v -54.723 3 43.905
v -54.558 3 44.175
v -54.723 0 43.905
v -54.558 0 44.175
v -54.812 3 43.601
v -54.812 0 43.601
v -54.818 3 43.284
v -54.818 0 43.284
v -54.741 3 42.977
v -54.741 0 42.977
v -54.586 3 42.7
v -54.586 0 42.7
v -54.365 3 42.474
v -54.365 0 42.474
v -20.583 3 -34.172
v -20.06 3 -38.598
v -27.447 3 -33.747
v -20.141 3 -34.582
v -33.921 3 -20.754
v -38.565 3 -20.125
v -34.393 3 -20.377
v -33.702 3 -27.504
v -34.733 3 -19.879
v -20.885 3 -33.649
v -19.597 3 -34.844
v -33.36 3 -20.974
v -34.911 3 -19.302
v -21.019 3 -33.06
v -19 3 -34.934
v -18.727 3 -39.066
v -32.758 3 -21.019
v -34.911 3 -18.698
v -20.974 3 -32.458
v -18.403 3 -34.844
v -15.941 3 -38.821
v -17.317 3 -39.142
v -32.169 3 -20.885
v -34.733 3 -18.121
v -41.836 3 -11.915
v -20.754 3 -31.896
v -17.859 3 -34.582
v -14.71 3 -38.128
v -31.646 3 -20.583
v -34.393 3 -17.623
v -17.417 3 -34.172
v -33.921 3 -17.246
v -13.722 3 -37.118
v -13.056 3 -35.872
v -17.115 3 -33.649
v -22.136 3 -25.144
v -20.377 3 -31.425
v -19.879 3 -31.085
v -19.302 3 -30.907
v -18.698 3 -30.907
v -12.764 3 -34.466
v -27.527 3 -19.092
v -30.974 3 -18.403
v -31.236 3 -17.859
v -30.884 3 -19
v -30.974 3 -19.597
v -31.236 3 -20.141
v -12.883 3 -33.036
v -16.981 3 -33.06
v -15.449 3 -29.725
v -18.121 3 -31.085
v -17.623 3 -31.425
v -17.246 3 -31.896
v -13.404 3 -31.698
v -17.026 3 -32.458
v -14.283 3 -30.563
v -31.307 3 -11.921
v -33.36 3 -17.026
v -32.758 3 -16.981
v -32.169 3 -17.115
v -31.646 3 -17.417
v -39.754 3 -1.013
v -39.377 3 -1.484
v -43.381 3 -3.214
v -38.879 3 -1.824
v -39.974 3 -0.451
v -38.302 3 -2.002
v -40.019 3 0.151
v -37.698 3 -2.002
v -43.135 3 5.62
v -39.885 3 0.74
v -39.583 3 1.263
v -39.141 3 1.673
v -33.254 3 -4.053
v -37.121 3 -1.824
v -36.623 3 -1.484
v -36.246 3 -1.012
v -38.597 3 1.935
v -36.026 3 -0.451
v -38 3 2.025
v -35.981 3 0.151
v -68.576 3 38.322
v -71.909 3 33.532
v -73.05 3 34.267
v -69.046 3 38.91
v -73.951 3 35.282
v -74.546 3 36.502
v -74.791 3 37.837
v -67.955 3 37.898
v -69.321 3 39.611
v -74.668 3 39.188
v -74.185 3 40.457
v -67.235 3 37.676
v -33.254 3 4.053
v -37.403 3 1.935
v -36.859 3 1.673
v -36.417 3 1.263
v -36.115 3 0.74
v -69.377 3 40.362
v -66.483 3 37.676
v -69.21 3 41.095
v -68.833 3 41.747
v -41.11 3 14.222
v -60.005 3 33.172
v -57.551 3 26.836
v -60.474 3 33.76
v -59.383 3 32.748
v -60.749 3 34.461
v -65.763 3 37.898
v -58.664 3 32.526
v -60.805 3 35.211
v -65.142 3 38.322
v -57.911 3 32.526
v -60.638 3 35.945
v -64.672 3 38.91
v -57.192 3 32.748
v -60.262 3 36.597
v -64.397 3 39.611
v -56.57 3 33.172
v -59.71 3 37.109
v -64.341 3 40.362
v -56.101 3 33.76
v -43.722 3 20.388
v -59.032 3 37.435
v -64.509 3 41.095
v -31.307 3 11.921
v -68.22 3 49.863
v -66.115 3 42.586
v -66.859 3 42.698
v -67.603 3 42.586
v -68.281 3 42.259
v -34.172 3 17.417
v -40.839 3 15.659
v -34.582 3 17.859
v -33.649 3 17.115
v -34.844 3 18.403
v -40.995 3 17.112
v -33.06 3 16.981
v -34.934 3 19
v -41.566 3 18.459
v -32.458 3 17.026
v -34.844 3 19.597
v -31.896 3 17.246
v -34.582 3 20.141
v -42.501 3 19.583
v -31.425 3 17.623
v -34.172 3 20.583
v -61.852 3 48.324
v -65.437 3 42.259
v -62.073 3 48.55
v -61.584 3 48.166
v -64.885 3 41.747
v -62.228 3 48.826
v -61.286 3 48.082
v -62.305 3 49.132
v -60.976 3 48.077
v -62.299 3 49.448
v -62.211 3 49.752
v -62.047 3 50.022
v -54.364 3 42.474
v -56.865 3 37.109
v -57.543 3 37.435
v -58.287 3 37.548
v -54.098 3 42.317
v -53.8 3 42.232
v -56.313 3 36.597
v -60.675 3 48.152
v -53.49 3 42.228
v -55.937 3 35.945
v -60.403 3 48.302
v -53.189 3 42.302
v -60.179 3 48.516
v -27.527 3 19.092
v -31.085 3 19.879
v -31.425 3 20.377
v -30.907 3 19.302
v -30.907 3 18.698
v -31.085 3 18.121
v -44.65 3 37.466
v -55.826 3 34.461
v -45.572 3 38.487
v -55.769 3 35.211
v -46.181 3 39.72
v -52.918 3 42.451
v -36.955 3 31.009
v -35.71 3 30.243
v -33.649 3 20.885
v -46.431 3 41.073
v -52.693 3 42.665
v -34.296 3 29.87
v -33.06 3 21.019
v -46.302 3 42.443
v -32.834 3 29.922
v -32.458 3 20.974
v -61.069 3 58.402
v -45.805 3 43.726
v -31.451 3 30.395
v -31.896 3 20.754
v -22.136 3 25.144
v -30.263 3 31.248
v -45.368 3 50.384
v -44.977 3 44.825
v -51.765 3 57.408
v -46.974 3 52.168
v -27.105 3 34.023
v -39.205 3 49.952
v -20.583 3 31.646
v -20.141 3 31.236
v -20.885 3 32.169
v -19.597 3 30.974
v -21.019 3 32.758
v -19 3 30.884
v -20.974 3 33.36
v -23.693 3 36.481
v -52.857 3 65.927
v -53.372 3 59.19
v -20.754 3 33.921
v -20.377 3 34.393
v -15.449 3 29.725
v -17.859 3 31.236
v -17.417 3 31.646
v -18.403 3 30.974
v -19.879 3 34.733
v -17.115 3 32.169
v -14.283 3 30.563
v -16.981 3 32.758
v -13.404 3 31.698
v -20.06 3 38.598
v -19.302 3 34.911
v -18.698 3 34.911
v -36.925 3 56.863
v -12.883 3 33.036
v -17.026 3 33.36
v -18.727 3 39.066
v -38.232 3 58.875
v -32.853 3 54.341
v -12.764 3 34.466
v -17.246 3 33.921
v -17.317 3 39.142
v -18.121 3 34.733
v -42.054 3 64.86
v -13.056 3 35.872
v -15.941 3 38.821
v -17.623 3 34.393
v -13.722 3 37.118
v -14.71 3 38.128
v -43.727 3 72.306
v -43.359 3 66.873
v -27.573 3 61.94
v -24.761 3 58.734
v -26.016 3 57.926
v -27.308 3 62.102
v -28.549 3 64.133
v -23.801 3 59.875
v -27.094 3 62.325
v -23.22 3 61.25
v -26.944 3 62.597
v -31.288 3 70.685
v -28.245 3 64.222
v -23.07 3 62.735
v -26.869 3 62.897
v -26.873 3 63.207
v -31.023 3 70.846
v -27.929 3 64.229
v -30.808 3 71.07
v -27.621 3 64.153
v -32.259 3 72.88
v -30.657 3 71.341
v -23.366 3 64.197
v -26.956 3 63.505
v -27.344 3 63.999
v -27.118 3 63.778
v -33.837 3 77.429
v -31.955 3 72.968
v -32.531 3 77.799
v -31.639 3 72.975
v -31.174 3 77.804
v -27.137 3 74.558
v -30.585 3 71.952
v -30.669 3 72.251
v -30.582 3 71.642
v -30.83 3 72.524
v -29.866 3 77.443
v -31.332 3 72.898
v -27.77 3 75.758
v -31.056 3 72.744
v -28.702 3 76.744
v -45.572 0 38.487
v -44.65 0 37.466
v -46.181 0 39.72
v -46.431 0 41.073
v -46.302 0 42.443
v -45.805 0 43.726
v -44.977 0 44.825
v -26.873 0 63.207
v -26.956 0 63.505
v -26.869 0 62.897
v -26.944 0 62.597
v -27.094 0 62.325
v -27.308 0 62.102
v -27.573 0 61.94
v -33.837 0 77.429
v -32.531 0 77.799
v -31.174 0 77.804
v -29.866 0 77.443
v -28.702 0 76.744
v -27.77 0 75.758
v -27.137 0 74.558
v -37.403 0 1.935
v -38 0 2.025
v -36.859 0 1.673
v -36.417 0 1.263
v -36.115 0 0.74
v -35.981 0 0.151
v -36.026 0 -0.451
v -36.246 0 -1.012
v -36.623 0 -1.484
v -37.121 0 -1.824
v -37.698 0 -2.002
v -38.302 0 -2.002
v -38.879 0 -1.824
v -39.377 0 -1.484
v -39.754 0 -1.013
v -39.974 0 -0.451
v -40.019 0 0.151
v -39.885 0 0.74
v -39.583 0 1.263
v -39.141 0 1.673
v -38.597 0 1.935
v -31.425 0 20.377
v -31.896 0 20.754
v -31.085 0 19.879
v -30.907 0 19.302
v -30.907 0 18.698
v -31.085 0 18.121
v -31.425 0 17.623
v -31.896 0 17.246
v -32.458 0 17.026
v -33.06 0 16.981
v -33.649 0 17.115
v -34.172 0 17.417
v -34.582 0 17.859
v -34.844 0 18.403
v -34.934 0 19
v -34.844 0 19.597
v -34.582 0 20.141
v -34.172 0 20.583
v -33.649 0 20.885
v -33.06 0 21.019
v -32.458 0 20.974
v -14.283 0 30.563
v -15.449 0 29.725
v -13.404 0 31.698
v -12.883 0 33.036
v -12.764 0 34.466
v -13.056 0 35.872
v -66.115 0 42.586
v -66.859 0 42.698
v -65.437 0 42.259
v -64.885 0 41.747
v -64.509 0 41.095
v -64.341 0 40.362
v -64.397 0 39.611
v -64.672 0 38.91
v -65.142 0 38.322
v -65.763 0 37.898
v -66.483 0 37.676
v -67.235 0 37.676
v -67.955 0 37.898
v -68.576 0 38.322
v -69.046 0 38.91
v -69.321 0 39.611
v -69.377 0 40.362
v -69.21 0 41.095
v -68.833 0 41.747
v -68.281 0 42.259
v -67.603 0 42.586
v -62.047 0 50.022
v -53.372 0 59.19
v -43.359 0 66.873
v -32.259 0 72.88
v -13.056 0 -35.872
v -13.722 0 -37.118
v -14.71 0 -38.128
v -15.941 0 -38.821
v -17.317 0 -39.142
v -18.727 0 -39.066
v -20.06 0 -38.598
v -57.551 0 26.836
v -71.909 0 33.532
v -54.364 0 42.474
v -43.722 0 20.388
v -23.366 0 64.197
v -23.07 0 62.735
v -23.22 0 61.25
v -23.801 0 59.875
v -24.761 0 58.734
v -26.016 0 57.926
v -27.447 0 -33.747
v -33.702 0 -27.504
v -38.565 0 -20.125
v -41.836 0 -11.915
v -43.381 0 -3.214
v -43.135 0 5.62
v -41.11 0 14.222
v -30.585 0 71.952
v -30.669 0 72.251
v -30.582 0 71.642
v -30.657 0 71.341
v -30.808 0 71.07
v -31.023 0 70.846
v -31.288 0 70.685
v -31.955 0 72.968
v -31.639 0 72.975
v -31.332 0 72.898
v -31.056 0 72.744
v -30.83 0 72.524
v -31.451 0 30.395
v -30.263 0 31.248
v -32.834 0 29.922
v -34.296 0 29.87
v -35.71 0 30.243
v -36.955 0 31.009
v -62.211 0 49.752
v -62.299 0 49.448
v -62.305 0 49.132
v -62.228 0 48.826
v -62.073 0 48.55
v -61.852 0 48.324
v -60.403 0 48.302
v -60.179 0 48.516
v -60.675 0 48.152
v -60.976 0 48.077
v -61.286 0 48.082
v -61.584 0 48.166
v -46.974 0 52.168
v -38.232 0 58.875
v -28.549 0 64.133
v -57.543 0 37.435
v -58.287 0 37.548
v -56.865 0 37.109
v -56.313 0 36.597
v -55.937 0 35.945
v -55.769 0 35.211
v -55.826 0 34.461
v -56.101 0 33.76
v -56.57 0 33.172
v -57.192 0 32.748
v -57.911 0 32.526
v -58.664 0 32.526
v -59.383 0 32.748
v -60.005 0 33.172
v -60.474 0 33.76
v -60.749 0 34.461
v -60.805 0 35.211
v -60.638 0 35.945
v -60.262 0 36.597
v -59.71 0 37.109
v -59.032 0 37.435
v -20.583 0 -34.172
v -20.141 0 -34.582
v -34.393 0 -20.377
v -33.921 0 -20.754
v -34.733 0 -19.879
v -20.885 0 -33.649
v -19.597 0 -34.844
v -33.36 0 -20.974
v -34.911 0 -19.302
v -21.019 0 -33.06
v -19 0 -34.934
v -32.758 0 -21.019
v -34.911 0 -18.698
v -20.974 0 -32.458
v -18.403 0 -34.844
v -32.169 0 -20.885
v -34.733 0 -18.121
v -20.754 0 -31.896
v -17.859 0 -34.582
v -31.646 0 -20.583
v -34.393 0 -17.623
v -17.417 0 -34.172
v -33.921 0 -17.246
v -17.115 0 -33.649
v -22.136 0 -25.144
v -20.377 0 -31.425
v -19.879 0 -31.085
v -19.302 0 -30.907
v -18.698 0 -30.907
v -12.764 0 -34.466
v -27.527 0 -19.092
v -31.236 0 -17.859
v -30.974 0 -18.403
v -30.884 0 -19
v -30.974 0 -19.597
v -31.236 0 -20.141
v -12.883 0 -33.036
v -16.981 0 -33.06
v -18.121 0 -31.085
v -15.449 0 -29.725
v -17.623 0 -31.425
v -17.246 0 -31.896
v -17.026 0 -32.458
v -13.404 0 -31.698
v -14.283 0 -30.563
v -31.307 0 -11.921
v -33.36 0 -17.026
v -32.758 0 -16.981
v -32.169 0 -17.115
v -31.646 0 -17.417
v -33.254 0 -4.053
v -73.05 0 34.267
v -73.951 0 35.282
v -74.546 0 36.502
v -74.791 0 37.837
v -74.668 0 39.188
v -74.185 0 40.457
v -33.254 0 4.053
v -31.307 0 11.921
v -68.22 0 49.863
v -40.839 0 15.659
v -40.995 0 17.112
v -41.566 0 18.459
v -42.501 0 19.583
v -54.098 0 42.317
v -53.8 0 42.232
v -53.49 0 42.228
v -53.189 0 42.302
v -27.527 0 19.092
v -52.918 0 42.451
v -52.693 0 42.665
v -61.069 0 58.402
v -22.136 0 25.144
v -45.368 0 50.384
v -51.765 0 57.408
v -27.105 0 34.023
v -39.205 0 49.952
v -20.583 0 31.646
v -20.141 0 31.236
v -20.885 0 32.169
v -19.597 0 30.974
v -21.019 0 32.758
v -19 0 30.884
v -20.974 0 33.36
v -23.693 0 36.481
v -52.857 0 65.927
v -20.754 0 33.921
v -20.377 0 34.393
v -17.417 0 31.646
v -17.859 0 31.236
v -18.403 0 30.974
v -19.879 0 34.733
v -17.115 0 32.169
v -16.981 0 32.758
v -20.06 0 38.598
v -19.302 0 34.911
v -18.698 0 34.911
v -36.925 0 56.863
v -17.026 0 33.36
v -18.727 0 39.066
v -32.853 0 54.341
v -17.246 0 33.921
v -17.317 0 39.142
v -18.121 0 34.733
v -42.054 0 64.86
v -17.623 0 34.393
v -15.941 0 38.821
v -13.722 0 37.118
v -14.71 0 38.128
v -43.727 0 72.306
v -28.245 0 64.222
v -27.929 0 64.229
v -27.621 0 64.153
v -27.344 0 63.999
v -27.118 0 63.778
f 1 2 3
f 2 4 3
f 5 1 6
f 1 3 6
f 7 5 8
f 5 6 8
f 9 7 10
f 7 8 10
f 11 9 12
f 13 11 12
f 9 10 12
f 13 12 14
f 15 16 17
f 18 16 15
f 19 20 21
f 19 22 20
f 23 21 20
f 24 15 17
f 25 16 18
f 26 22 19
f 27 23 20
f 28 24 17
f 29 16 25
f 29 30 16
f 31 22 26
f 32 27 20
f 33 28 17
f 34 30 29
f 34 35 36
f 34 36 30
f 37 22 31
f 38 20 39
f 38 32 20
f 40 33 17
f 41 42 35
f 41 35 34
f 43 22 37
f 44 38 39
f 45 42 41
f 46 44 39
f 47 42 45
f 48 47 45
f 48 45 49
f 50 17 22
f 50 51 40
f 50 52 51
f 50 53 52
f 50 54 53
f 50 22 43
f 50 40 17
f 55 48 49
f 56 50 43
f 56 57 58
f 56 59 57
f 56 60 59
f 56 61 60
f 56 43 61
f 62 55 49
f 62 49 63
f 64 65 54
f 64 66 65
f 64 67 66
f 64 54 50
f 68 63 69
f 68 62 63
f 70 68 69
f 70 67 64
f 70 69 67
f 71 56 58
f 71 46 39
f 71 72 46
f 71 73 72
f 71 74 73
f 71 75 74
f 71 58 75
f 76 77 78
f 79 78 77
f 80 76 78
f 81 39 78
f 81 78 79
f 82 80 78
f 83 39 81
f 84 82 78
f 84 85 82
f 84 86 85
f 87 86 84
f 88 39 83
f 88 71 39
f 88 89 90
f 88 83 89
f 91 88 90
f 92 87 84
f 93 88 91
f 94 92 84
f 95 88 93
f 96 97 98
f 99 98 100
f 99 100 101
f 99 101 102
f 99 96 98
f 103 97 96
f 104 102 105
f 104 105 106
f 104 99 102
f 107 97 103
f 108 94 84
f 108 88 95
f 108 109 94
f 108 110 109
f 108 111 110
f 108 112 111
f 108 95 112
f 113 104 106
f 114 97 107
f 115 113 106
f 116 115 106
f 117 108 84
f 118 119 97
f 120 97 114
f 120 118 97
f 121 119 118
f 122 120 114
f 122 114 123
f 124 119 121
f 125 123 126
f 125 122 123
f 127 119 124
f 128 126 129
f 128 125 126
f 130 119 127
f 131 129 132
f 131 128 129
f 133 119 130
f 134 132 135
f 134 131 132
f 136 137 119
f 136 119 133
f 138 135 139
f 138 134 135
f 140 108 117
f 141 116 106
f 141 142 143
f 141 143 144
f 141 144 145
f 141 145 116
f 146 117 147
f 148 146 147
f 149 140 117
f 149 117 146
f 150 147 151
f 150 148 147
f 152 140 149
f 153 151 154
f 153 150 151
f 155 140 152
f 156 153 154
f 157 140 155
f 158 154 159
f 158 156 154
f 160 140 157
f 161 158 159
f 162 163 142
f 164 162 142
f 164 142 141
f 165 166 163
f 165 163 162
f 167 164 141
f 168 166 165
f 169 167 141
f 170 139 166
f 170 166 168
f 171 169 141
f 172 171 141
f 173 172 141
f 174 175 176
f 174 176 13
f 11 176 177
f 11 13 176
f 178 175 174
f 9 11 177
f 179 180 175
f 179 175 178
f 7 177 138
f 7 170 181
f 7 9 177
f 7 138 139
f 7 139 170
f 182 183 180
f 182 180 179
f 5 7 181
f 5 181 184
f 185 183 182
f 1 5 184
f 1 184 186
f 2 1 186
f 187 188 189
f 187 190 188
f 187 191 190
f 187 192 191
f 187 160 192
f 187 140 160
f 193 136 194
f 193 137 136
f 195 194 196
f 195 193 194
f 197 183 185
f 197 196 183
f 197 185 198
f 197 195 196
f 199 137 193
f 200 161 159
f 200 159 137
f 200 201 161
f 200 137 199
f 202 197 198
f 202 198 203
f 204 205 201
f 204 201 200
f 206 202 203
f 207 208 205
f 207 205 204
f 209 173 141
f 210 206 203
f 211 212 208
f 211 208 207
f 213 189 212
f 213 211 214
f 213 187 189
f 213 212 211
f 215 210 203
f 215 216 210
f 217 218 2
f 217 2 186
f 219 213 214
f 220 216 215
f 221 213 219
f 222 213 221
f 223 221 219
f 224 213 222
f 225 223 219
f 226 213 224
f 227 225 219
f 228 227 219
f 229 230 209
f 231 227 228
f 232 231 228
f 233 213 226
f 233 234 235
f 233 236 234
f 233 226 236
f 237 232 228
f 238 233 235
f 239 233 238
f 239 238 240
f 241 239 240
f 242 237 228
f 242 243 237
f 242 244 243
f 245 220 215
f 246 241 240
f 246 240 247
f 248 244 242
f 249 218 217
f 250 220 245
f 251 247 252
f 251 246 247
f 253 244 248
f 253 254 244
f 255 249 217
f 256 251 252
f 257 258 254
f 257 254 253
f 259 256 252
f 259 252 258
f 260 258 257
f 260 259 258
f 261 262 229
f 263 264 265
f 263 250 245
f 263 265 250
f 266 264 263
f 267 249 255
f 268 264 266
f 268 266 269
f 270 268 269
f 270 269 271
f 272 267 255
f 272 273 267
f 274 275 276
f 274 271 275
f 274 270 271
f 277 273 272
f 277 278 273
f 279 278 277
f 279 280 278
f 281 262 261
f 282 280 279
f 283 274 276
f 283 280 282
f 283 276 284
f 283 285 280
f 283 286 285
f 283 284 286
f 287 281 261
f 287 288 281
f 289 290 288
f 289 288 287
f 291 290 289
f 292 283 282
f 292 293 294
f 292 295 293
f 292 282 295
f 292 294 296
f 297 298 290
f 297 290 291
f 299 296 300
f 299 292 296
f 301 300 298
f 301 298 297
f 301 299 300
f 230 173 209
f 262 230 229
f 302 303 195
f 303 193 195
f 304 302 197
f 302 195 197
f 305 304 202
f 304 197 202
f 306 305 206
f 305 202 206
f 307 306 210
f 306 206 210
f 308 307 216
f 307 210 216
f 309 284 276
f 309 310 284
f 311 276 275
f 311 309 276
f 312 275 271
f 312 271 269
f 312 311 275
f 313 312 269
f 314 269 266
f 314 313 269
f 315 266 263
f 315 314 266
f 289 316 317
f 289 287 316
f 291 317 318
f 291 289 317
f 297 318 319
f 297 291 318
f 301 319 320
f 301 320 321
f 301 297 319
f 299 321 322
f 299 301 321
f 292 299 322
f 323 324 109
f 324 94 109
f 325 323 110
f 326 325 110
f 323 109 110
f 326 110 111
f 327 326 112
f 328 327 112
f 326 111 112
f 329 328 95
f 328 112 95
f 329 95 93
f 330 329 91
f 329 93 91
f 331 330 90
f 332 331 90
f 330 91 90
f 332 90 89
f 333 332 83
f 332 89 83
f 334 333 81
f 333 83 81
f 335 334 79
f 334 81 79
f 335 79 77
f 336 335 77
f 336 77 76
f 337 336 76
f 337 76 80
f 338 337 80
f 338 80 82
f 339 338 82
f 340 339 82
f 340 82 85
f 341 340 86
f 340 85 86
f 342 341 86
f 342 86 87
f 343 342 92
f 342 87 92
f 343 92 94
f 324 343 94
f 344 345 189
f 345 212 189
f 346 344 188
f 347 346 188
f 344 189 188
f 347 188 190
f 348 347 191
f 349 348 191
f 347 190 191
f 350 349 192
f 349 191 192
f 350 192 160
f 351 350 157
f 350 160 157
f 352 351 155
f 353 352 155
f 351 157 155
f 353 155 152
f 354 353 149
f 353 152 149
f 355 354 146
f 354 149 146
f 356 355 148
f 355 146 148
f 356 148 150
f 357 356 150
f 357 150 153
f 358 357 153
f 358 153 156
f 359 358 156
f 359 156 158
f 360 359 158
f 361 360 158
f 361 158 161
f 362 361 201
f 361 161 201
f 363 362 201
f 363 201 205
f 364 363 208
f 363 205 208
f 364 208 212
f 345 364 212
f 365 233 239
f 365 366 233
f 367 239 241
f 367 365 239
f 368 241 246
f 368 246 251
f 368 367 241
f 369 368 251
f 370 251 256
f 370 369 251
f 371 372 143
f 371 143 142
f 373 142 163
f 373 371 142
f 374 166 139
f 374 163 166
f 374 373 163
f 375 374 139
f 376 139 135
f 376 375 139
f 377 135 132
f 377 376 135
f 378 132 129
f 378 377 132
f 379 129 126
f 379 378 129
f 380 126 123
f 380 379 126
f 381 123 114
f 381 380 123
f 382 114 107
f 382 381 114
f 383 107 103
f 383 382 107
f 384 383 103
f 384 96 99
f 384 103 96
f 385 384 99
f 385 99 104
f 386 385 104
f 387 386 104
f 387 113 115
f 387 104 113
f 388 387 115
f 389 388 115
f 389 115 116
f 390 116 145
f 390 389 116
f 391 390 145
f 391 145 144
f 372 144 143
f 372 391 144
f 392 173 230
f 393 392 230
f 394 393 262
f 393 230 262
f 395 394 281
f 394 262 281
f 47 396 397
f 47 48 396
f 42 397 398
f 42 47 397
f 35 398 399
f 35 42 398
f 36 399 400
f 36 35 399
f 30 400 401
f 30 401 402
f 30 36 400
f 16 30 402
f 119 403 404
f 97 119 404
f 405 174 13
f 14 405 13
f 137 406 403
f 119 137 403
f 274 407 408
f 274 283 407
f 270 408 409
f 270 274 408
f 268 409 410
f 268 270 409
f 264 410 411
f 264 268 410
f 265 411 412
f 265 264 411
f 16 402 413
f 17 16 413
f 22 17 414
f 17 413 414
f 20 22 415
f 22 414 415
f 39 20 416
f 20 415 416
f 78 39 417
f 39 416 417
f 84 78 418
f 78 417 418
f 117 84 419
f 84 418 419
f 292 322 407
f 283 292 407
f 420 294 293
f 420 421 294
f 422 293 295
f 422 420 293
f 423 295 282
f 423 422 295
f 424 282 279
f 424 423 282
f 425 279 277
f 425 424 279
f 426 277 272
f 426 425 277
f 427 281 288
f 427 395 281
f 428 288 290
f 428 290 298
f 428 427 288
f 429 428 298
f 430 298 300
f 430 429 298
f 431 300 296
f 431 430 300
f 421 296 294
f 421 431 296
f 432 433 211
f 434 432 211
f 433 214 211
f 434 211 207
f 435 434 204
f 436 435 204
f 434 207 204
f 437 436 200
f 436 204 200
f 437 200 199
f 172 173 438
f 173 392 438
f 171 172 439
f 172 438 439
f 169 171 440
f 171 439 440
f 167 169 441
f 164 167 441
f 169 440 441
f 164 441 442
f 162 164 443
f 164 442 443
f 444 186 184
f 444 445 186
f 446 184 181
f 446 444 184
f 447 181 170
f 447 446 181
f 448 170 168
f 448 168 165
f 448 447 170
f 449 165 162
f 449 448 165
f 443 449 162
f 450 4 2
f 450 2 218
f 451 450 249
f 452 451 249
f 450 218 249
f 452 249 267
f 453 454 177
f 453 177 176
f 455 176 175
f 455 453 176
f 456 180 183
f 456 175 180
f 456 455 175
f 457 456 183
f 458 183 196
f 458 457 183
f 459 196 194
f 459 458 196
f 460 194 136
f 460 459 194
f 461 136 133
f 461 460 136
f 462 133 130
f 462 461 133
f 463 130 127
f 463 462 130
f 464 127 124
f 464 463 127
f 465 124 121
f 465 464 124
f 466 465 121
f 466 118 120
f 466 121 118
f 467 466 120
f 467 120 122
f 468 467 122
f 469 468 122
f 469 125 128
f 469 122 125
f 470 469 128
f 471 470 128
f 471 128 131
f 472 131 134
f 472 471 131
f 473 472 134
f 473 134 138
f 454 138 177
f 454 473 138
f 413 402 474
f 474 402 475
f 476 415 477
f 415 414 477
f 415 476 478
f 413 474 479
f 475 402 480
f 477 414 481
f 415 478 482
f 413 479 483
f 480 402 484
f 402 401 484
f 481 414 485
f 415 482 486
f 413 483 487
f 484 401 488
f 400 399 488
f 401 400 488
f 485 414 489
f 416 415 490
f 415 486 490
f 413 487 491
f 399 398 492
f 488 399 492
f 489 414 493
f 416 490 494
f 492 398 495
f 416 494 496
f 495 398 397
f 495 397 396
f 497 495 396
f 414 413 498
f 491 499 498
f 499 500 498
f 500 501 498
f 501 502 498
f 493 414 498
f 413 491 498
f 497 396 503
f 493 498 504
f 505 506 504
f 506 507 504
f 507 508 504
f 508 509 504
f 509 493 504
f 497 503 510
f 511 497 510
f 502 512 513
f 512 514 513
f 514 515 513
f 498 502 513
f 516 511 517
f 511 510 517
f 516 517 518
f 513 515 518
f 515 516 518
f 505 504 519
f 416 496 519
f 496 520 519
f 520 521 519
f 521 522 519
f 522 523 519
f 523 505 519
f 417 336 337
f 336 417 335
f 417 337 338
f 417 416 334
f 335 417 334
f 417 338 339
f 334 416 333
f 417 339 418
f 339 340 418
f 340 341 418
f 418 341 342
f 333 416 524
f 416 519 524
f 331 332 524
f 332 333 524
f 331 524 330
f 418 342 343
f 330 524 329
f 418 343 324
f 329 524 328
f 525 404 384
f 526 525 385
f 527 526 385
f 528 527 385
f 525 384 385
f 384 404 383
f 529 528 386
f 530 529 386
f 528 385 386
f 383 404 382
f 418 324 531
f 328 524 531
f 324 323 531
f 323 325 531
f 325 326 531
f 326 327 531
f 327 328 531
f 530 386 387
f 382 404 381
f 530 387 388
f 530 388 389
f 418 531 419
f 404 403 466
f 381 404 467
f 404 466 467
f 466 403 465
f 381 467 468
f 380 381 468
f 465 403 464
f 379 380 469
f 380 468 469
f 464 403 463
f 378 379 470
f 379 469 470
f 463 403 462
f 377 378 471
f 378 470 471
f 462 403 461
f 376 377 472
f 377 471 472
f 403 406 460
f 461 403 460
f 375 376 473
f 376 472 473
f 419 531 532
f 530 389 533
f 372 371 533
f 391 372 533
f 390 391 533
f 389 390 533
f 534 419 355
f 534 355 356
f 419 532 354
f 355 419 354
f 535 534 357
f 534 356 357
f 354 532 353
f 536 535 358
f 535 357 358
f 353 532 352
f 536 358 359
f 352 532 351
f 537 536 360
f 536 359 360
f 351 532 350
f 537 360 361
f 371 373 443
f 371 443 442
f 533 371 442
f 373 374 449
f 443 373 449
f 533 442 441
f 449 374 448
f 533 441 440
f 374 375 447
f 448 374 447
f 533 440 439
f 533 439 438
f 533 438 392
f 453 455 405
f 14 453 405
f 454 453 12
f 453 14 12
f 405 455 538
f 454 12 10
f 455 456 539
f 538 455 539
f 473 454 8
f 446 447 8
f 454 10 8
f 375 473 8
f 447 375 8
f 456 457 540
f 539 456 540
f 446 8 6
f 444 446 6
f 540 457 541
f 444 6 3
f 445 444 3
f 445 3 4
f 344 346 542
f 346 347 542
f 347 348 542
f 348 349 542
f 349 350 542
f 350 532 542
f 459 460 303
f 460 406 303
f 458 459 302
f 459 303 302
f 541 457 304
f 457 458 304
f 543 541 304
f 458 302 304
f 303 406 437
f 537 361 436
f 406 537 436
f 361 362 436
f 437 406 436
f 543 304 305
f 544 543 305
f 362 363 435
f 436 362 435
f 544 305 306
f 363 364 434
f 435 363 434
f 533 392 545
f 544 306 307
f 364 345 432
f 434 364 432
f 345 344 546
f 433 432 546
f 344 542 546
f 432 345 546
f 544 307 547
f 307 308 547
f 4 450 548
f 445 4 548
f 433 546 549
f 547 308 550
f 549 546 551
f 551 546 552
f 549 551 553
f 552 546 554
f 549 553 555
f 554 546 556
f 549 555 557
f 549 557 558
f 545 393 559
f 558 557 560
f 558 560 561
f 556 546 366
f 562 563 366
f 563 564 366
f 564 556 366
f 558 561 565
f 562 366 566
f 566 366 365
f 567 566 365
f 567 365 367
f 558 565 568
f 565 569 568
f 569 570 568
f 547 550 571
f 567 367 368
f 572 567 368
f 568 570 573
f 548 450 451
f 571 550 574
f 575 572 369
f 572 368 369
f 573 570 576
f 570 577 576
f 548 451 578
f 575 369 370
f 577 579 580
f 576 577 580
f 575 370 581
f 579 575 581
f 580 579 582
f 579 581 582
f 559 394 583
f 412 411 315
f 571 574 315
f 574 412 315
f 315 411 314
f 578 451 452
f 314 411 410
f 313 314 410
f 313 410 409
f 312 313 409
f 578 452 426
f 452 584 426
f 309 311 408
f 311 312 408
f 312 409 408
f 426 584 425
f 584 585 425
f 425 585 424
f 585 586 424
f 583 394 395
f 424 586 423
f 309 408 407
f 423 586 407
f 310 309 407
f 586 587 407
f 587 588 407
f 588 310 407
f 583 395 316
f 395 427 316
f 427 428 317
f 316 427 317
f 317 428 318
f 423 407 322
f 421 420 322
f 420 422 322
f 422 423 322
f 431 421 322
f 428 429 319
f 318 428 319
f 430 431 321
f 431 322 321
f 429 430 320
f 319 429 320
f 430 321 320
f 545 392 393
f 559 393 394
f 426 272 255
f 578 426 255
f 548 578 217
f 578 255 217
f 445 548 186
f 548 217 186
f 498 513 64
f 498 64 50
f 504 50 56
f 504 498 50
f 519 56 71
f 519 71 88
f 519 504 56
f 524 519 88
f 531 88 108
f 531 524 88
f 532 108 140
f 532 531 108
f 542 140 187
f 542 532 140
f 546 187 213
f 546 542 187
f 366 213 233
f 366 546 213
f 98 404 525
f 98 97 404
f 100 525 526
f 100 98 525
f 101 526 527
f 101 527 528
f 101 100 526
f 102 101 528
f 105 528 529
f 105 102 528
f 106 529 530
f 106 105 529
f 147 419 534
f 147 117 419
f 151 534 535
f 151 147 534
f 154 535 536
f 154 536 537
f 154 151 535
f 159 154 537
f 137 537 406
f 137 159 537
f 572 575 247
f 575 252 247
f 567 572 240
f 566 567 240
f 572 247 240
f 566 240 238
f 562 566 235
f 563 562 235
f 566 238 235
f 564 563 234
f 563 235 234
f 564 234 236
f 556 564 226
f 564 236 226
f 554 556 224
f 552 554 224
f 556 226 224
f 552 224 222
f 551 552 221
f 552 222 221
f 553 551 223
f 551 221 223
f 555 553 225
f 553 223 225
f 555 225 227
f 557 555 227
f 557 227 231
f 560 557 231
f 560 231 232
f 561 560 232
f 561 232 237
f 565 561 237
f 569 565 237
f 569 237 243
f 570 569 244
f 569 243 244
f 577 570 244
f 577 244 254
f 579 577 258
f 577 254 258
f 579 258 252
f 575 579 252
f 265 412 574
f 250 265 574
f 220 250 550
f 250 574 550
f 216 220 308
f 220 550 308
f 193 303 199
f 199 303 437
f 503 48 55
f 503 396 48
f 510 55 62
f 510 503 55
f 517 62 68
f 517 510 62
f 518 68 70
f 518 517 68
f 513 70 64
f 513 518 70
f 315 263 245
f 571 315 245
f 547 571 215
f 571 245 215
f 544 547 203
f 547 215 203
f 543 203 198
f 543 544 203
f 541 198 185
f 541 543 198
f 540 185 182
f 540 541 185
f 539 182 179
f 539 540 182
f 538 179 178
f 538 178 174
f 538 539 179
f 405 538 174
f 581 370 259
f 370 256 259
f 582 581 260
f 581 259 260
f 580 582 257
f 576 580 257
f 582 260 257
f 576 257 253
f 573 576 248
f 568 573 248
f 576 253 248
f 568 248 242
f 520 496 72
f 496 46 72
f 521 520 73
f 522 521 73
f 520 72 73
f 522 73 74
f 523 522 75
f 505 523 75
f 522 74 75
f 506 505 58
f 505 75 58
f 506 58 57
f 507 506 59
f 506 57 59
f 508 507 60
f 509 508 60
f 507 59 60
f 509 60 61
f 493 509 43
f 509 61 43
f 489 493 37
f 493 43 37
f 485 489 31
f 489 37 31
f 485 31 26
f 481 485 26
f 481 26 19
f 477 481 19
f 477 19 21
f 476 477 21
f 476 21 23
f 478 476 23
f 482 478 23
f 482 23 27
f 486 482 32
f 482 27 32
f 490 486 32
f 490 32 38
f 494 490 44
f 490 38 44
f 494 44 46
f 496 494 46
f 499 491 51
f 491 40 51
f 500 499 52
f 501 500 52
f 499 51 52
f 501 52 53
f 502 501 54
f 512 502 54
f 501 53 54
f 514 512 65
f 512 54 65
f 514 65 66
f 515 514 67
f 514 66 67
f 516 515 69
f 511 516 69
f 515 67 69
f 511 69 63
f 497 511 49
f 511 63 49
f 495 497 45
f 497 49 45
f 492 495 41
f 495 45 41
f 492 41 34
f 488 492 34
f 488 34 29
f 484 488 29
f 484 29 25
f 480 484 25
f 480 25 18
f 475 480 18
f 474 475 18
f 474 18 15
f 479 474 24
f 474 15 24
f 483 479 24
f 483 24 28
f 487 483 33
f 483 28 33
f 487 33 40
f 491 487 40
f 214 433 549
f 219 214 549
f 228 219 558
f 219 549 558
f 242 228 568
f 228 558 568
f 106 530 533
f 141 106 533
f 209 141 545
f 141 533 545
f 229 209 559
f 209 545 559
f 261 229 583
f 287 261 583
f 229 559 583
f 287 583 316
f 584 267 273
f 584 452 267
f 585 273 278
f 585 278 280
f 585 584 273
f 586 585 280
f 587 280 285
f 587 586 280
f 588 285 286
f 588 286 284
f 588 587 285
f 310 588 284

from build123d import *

# Parameters (mm, degrees)
SKETCH1_R               = 43.5
SKETCH1_R_2             = 33.5
BOSS_EXTRUDE1_DEPTH     = 3
SKETCH3_R               = 2.025
CUT_EXTRUDE2_DEPTH      = 62.591395503
CIRPATTERN1_COUNT       = 12
CUT_EXTRUDE1_DEPTH      = 62.591395503
BOSS_EXTRUDE2_DEPTH     = 3
CUT_EXTRUDE_THIN1_DEPTH = 3
FILLET1_R               = 1.2
FILLET2_R               = 5
CUT_EXTRUDE3_DEPTH      = 108.998410492
CUT_EXTRUDE3_DEPTH_BACK = 108.998410492
SKETCH6_R               = 2.525


with BuildPart() as part:
    # Sketch1 → Boss-Extrude1 (new body)
    with BuildSketch(Plane(origin=(0, 0, 0), x_dir=(1, 0, 0), z_dir=(0, 1, 0))):
        with Locations(Location((0, 0, 0), (0, 0, 270))):
            Circle(SKETCH1_R)
        with Locations(Location((0, 0, 0), (0, 0, 270))):
            Circle(SKETCH1_R_2, mode=Mode.SUBTRACT)
    extrude(amount=BOSS_EXTRUDE1_DEPTH)

    # Sketch3 → Cut-Extrude2 (cut, symmetric)
    with BuildSketch(Plane(origin=(0, 3, 0), x_dir=(1, 0, 0), z_dir=(0, 1, 0))):
        with Locations(Location((-38, 0, 0), (0, 0, 270))):
            Circle(SKETCH3_R)
    cut_extrude2 = extrude(amount=CUT_EXTRUDE2_DEPTH, both=True, mode=Mode.SUBTRACT)

    # CirPattern1: Cut-Extrude2 ×12 about axis
    cirpattern1_axis = Axis((0, 0, 0), (0, 1, 0))
    for i in range(1, CIRPATTERN1_COUNT):
        add(cut_extrude2.rotate(cirpattern1_axis, i * 360 / CIRPATTERN1_COUNT), mode=Mode.SUBTRACT)

    # Sketch2 → Cut-Extrude1 (cut, symmetric)
    with BuildSketch(Plane(origin=(0, 3, 0), x_dir=(1, 0, 0), z_dir=(0, 1, 0))):
        with BuildLine():
            Line((0, 0), (43.5, 0))
            ThreePointArc((43.5, 0), (24.950574981, -35.633113927), (-14.877876235, -40.876629004))
            Line((-14.877876235, -40.876629004), (0, 0))
        make_face()
    cut_extrude1 = extrude(amount=CUT_EXTRUDE1_DEPTH, both=True, mode=Mode.SUBTRACT)

    # Mirror1: Cut-Extrude1 across plane
    add(cut_extrude1.mirror(Plane.XY), mode=Mode.SUBTRACT)

    # Sketch4 → Boss-Extrude2 (add)
    with BuildSketch(Plane(origin=(0, 0, 0), x_dir=(1, 0, 0), z_dir=(0, 1, 0))):
        with BuildLine():
            ThreePointArc((-33.322933276, -27.961261021), (-36.687527893, -23.372532963), (-39.424388736, -18.383894386))
            Line((-39.424388736, -18.383894386), (-57.550544477, -26.836259621))
            Line((-57.550544477, -26.836259621), (-76.583008005, -35.711243117))
            ThreePointArc((-76.583008005, -35.711243117), (-57.087372544, -62.29993496), (-28.900702111, -79.404026456))
            Line((-28.900702111, -79.404026456), (-21.718279101, -59.67048142))
            ThreePointArc((-21.718279101, -59.67048142), (-36.422103708, -52.016154812), (-48.643822138, -40.817013215))
            Line((-48.643822138, -40.817013215), (-33.322933276, -27.961261021))
        make_face()
    extrude(amount=BOSS_EXTRUDE2_DEPTH)

    # Sketch5 → Cut-Extrude-Thin1 (cut)
    with BuildSketch(Plane(origin=(0, 3, 0), x_dir=(1, 0, 0), z_dir=(0, 1, 0))):
        with BuildLine():
            ThreePointArc((-55.318354903, -43.219435568), (-42.735052316, -55.693404488), (-27.42932522, -64.619440712))
            Line((-27.42932522, -64.619440712), (-26.491570512, -62.410229064))
            ThreePointArc((-26.491570512, -62.410229064), (-41.274024887, -53.789356472), (-53.427129095, -41.741848027))
            Line((-53.427129095, -41.741848027), (-55.318354903, -43.219435568))
        make_face()
        with BuildLine():
            ThreePointArc((-62.804457062, -49.068219583), (-48.518285892, -63.230261221), (-31.141270941, -73.36423682))
            Line((-31.141270941, -73.36423682), (-30.203516232, -71.155025172))
            ThreePointArc((-30.203516232, -71.155025172), (-47.057258462, -61.326213205), (-60.913231254, -47.590632043))
            Line((-60.913231254, -47.590632043), (-62.804457062, -49.068219583))
        make_face()
    extrude(amount=-CUT_EXTRUDE_THIN1_DEPTH, mode=Mode.SUBTRACT)

    # Fillet1
    fillet1_edges = [part.edges().sort_by_distance(p)[0] for p in [
        (-55.318354903, 1.5, 43.219435568),
        (-62.804457062, 1.5, 49.068219583),
        (-53.427129095, 1.5, 41.741848027),
        (-60.913231254, 1.5, 47.590632043),
        (-26.491570512, 1.5, 62.410229064),
        (-30.203516232, 1.5, 71.155025172),
        (-27.42932522, 1.5, 64.619440712),
        (-31.141270941, 1.5, 73.36423682),
    ]]
    fillet(fillet1_edges, radius=FILLET1_R - 0.0001)  # a hair under: the kernel refuses the full size

    # Fillet2
    fillet2_edges = [part.edges().sort_by_distance(p)[0] for p in [
        (-14.877876235, 1.5, -40.876629004),
        (-11.457674801, 1.5, -31.479702796),
        (-11.457674801, 1.5, 31.479702796),
        (-14.877876235, 1.5, 40.876629004),
        (-39.424388736, 1.5, 18.383894386),
        (-76.583008005, 1.5, 35.711243117),
        (-28.900702111, 1.5, 79.404026456),
        (-21.718279101, 1.5, 59.67048142),
        (-33.322933276, 1.5, 27.961261021),
        (-48.643822138, 1.5, 40.817013215),
    ]]
    fillet(fillet2_edges, radius=FILLET2_R - 0.0001)  # a hair under: the kernel refuses the full size

    # Sketch6 → Cut-Extrude3 (cut, two sides: drawn at the far end of the back side and taken through both)
    with BuildSketch(Plane(origin=(0, 3, 0), x_dir=(1, 0, 0), z_dir=(0, 1, 0)).offset(-CUT_EXTRUDE3_DEPTH_BACK)):
        with Locations(Location((-58.287376448, -35.022589094, 0), (0, 0, 270))):
            Circle(SKETCH6_R)
        with Locations(Location((-66.859049455, -40.172969843, 0), (0, 0, 270))):
            Circle(SKETCH6_R)
    extrude(amount=CUT_EXTRUDE3_DEPTH + CUT_EXTRUDE3_DEPTH_BACK, mode=Mode.SUBTRACT)


solid = part.part
